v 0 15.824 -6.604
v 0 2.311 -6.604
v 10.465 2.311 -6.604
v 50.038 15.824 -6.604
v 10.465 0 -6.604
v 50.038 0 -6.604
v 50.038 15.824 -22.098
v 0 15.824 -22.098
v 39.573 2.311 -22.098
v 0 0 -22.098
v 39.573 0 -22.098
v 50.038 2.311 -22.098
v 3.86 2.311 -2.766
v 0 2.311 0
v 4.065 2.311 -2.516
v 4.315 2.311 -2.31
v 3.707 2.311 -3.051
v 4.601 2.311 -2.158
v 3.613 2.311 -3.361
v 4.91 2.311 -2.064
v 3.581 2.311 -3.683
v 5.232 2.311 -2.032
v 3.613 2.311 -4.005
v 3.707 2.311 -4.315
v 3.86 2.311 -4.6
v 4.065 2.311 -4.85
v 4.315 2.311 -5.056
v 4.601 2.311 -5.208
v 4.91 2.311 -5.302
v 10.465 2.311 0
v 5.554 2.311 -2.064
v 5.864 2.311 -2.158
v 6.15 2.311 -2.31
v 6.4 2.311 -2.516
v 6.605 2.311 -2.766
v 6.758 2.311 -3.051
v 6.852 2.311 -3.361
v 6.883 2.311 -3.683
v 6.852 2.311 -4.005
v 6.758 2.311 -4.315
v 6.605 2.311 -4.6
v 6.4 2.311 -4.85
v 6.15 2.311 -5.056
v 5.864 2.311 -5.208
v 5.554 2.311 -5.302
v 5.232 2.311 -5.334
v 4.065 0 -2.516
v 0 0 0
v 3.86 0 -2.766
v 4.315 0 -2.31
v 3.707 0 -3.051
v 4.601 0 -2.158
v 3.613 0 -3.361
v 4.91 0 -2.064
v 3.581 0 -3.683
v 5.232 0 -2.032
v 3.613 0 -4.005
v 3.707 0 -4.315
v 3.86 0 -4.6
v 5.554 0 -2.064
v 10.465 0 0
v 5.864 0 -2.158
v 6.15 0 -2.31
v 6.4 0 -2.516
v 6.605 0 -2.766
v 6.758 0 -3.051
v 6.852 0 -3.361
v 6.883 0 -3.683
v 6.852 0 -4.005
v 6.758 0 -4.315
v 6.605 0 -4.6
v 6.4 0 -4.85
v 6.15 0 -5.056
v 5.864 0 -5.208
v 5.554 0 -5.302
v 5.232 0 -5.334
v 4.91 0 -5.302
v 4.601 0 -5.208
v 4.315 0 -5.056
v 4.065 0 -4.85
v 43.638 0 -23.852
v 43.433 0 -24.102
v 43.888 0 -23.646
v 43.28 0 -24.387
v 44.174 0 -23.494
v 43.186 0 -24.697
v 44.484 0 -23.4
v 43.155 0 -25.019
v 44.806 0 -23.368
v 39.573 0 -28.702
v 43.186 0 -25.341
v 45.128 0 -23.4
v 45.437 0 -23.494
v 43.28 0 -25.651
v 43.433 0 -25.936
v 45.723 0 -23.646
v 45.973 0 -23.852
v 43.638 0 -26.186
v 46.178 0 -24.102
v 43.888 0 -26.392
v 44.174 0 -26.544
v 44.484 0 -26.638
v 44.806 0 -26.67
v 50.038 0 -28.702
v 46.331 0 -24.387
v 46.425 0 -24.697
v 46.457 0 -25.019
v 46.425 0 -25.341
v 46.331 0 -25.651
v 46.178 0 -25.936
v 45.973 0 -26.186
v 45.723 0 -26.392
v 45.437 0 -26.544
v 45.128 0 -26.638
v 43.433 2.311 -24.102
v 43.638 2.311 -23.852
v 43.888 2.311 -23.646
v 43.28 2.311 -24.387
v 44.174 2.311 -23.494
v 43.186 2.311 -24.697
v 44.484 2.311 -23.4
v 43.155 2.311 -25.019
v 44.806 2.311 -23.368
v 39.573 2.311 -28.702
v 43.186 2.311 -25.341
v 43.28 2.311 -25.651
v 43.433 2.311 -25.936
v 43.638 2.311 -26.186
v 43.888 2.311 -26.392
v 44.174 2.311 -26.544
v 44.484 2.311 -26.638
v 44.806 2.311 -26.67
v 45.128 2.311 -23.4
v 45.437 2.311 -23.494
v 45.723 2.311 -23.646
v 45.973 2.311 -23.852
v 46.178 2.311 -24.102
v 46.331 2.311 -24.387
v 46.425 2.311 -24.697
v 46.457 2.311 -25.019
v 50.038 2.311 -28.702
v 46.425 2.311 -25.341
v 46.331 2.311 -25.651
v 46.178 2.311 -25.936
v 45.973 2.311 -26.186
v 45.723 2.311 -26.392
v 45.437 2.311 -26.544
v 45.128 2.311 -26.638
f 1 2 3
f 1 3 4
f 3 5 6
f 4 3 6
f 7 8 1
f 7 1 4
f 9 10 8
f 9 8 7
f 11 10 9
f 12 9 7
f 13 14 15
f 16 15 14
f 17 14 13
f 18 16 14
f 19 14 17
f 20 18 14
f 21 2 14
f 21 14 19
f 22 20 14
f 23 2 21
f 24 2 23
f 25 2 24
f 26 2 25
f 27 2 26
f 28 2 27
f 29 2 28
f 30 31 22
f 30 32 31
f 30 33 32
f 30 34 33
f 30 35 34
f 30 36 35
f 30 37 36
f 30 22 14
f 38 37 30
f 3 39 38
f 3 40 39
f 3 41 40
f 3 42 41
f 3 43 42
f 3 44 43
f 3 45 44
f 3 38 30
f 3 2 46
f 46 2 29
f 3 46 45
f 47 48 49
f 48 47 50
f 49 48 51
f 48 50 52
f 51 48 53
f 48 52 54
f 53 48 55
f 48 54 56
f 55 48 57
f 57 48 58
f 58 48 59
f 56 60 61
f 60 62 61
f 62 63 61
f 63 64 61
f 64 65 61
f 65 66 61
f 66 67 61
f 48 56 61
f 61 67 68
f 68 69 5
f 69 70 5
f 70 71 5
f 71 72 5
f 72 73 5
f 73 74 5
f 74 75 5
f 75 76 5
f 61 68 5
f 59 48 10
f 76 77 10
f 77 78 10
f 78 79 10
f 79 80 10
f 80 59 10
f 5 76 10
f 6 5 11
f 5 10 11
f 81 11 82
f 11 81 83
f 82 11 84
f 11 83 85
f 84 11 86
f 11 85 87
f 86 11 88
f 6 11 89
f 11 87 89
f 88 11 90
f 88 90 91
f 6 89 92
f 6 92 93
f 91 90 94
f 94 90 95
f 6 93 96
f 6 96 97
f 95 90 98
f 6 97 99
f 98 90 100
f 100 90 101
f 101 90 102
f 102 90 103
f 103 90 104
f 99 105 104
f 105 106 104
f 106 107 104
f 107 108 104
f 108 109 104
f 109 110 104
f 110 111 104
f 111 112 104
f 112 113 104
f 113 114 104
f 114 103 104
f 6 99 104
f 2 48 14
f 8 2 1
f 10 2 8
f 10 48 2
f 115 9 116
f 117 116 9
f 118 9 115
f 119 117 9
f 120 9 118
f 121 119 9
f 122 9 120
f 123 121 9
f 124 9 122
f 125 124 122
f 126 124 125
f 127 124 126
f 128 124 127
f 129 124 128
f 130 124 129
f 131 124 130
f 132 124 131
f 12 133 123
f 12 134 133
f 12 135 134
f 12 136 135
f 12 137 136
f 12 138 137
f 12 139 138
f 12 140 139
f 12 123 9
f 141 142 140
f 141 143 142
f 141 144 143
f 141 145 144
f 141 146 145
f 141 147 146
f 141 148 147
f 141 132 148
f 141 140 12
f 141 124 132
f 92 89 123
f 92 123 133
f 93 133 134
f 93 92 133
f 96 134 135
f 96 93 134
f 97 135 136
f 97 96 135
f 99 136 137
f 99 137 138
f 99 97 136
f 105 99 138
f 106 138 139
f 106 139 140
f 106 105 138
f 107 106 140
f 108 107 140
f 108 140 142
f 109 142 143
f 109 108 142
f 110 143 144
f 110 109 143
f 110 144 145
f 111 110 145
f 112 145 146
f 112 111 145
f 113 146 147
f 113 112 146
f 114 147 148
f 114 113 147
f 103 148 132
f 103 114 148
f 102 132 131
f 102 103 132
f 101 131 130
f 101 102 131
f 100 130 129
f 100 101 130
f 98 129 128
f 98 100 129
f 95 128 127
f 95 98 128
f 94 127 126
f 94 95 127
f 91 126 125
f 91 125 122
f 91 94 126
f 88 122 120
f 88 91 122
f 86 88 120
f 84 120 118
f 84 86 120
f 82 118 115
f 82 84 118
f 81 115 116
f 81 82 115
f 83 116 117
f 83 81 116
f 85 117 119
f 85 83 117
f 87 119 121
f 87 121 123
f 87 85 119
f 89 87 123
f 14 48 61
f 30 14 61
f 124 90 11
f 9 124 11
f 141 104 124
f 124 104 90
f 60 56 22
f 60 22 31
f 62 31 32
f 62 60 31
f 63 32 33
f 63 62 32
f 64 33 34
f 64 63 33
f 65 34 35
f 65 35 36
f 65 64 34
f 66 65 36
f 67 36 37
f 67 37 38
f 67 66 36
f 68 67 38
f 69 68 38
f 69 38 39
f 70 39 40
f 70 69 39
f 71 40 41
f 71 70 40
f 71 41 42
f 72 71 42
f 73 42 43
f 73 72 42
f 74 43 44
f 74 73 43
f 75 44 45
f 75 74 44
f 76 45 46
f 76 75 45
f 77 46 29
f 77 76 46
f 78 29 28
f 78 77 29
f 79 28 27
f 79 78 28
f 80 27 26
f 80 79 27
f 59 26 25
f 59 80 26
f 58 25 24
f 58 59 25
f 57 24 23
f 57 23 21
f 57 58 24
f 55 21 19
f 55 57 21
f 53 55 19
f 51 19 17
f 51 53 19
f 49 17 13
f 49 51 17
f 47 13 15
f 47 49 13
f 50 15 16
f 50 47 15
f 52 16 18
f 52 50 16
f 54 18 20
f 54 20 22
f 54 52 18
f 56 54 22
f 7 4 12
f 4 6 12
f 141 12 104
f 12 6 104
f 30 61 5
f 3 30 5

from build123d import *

# Parameters (mm, degrees)
SKETCH1_R           = 1.651
BOSS_EXTRUDE1_DEPTH = 2.3114
SKETCH2_W           = 50.038
SKETCH2_H           = 15.494
BOSS_EXTRUDE2_DEPTH = 13.5128


with BuildPart() as part:
    # Sketch1 → Boss-Extrude1 (new body)
    with BuildSketch(Plane(origin=(0, 0, 0), x_dir=(1, 0, 0), z_dir=(0, 1, 0))):
        Polygon((0, 0), (10.4648, 0), (10.4648, 6.604), (50.038, 6.604), (50.038, 28.702), (39.5732, 28.702), (39.5732, 22.098), (0, 22.098), align=None)
        with Locations(Location((5.2324, 3.683, 0), (0, 0, 270))):
            Circle(SKETCH1_R, mode=Mode.SUBTRACT)
        with Locations(Location((44.8056, 25.019, 0), (0, 0, 270))):
            Circle(SKETCH1_R, mode=Mode.SUBTRACT)
    extrude(amount=BOSS_EXTRUDE1_DEPTH)

    # Sketch2 → Boss-Extrude2 (add)
    with BuildSketch(Plane(origin=(0, 2.3114, 0), x_dir=(1, 0, 0), z_dir=(0, 1, 0))):
        with Locations((25.019, 14.351)):
            Rectangle(SKETCH2_W, SKETCH2_H)
    extrude(amount=BOSS_EXTRUDE2_DEPTH)


solid = part.part
